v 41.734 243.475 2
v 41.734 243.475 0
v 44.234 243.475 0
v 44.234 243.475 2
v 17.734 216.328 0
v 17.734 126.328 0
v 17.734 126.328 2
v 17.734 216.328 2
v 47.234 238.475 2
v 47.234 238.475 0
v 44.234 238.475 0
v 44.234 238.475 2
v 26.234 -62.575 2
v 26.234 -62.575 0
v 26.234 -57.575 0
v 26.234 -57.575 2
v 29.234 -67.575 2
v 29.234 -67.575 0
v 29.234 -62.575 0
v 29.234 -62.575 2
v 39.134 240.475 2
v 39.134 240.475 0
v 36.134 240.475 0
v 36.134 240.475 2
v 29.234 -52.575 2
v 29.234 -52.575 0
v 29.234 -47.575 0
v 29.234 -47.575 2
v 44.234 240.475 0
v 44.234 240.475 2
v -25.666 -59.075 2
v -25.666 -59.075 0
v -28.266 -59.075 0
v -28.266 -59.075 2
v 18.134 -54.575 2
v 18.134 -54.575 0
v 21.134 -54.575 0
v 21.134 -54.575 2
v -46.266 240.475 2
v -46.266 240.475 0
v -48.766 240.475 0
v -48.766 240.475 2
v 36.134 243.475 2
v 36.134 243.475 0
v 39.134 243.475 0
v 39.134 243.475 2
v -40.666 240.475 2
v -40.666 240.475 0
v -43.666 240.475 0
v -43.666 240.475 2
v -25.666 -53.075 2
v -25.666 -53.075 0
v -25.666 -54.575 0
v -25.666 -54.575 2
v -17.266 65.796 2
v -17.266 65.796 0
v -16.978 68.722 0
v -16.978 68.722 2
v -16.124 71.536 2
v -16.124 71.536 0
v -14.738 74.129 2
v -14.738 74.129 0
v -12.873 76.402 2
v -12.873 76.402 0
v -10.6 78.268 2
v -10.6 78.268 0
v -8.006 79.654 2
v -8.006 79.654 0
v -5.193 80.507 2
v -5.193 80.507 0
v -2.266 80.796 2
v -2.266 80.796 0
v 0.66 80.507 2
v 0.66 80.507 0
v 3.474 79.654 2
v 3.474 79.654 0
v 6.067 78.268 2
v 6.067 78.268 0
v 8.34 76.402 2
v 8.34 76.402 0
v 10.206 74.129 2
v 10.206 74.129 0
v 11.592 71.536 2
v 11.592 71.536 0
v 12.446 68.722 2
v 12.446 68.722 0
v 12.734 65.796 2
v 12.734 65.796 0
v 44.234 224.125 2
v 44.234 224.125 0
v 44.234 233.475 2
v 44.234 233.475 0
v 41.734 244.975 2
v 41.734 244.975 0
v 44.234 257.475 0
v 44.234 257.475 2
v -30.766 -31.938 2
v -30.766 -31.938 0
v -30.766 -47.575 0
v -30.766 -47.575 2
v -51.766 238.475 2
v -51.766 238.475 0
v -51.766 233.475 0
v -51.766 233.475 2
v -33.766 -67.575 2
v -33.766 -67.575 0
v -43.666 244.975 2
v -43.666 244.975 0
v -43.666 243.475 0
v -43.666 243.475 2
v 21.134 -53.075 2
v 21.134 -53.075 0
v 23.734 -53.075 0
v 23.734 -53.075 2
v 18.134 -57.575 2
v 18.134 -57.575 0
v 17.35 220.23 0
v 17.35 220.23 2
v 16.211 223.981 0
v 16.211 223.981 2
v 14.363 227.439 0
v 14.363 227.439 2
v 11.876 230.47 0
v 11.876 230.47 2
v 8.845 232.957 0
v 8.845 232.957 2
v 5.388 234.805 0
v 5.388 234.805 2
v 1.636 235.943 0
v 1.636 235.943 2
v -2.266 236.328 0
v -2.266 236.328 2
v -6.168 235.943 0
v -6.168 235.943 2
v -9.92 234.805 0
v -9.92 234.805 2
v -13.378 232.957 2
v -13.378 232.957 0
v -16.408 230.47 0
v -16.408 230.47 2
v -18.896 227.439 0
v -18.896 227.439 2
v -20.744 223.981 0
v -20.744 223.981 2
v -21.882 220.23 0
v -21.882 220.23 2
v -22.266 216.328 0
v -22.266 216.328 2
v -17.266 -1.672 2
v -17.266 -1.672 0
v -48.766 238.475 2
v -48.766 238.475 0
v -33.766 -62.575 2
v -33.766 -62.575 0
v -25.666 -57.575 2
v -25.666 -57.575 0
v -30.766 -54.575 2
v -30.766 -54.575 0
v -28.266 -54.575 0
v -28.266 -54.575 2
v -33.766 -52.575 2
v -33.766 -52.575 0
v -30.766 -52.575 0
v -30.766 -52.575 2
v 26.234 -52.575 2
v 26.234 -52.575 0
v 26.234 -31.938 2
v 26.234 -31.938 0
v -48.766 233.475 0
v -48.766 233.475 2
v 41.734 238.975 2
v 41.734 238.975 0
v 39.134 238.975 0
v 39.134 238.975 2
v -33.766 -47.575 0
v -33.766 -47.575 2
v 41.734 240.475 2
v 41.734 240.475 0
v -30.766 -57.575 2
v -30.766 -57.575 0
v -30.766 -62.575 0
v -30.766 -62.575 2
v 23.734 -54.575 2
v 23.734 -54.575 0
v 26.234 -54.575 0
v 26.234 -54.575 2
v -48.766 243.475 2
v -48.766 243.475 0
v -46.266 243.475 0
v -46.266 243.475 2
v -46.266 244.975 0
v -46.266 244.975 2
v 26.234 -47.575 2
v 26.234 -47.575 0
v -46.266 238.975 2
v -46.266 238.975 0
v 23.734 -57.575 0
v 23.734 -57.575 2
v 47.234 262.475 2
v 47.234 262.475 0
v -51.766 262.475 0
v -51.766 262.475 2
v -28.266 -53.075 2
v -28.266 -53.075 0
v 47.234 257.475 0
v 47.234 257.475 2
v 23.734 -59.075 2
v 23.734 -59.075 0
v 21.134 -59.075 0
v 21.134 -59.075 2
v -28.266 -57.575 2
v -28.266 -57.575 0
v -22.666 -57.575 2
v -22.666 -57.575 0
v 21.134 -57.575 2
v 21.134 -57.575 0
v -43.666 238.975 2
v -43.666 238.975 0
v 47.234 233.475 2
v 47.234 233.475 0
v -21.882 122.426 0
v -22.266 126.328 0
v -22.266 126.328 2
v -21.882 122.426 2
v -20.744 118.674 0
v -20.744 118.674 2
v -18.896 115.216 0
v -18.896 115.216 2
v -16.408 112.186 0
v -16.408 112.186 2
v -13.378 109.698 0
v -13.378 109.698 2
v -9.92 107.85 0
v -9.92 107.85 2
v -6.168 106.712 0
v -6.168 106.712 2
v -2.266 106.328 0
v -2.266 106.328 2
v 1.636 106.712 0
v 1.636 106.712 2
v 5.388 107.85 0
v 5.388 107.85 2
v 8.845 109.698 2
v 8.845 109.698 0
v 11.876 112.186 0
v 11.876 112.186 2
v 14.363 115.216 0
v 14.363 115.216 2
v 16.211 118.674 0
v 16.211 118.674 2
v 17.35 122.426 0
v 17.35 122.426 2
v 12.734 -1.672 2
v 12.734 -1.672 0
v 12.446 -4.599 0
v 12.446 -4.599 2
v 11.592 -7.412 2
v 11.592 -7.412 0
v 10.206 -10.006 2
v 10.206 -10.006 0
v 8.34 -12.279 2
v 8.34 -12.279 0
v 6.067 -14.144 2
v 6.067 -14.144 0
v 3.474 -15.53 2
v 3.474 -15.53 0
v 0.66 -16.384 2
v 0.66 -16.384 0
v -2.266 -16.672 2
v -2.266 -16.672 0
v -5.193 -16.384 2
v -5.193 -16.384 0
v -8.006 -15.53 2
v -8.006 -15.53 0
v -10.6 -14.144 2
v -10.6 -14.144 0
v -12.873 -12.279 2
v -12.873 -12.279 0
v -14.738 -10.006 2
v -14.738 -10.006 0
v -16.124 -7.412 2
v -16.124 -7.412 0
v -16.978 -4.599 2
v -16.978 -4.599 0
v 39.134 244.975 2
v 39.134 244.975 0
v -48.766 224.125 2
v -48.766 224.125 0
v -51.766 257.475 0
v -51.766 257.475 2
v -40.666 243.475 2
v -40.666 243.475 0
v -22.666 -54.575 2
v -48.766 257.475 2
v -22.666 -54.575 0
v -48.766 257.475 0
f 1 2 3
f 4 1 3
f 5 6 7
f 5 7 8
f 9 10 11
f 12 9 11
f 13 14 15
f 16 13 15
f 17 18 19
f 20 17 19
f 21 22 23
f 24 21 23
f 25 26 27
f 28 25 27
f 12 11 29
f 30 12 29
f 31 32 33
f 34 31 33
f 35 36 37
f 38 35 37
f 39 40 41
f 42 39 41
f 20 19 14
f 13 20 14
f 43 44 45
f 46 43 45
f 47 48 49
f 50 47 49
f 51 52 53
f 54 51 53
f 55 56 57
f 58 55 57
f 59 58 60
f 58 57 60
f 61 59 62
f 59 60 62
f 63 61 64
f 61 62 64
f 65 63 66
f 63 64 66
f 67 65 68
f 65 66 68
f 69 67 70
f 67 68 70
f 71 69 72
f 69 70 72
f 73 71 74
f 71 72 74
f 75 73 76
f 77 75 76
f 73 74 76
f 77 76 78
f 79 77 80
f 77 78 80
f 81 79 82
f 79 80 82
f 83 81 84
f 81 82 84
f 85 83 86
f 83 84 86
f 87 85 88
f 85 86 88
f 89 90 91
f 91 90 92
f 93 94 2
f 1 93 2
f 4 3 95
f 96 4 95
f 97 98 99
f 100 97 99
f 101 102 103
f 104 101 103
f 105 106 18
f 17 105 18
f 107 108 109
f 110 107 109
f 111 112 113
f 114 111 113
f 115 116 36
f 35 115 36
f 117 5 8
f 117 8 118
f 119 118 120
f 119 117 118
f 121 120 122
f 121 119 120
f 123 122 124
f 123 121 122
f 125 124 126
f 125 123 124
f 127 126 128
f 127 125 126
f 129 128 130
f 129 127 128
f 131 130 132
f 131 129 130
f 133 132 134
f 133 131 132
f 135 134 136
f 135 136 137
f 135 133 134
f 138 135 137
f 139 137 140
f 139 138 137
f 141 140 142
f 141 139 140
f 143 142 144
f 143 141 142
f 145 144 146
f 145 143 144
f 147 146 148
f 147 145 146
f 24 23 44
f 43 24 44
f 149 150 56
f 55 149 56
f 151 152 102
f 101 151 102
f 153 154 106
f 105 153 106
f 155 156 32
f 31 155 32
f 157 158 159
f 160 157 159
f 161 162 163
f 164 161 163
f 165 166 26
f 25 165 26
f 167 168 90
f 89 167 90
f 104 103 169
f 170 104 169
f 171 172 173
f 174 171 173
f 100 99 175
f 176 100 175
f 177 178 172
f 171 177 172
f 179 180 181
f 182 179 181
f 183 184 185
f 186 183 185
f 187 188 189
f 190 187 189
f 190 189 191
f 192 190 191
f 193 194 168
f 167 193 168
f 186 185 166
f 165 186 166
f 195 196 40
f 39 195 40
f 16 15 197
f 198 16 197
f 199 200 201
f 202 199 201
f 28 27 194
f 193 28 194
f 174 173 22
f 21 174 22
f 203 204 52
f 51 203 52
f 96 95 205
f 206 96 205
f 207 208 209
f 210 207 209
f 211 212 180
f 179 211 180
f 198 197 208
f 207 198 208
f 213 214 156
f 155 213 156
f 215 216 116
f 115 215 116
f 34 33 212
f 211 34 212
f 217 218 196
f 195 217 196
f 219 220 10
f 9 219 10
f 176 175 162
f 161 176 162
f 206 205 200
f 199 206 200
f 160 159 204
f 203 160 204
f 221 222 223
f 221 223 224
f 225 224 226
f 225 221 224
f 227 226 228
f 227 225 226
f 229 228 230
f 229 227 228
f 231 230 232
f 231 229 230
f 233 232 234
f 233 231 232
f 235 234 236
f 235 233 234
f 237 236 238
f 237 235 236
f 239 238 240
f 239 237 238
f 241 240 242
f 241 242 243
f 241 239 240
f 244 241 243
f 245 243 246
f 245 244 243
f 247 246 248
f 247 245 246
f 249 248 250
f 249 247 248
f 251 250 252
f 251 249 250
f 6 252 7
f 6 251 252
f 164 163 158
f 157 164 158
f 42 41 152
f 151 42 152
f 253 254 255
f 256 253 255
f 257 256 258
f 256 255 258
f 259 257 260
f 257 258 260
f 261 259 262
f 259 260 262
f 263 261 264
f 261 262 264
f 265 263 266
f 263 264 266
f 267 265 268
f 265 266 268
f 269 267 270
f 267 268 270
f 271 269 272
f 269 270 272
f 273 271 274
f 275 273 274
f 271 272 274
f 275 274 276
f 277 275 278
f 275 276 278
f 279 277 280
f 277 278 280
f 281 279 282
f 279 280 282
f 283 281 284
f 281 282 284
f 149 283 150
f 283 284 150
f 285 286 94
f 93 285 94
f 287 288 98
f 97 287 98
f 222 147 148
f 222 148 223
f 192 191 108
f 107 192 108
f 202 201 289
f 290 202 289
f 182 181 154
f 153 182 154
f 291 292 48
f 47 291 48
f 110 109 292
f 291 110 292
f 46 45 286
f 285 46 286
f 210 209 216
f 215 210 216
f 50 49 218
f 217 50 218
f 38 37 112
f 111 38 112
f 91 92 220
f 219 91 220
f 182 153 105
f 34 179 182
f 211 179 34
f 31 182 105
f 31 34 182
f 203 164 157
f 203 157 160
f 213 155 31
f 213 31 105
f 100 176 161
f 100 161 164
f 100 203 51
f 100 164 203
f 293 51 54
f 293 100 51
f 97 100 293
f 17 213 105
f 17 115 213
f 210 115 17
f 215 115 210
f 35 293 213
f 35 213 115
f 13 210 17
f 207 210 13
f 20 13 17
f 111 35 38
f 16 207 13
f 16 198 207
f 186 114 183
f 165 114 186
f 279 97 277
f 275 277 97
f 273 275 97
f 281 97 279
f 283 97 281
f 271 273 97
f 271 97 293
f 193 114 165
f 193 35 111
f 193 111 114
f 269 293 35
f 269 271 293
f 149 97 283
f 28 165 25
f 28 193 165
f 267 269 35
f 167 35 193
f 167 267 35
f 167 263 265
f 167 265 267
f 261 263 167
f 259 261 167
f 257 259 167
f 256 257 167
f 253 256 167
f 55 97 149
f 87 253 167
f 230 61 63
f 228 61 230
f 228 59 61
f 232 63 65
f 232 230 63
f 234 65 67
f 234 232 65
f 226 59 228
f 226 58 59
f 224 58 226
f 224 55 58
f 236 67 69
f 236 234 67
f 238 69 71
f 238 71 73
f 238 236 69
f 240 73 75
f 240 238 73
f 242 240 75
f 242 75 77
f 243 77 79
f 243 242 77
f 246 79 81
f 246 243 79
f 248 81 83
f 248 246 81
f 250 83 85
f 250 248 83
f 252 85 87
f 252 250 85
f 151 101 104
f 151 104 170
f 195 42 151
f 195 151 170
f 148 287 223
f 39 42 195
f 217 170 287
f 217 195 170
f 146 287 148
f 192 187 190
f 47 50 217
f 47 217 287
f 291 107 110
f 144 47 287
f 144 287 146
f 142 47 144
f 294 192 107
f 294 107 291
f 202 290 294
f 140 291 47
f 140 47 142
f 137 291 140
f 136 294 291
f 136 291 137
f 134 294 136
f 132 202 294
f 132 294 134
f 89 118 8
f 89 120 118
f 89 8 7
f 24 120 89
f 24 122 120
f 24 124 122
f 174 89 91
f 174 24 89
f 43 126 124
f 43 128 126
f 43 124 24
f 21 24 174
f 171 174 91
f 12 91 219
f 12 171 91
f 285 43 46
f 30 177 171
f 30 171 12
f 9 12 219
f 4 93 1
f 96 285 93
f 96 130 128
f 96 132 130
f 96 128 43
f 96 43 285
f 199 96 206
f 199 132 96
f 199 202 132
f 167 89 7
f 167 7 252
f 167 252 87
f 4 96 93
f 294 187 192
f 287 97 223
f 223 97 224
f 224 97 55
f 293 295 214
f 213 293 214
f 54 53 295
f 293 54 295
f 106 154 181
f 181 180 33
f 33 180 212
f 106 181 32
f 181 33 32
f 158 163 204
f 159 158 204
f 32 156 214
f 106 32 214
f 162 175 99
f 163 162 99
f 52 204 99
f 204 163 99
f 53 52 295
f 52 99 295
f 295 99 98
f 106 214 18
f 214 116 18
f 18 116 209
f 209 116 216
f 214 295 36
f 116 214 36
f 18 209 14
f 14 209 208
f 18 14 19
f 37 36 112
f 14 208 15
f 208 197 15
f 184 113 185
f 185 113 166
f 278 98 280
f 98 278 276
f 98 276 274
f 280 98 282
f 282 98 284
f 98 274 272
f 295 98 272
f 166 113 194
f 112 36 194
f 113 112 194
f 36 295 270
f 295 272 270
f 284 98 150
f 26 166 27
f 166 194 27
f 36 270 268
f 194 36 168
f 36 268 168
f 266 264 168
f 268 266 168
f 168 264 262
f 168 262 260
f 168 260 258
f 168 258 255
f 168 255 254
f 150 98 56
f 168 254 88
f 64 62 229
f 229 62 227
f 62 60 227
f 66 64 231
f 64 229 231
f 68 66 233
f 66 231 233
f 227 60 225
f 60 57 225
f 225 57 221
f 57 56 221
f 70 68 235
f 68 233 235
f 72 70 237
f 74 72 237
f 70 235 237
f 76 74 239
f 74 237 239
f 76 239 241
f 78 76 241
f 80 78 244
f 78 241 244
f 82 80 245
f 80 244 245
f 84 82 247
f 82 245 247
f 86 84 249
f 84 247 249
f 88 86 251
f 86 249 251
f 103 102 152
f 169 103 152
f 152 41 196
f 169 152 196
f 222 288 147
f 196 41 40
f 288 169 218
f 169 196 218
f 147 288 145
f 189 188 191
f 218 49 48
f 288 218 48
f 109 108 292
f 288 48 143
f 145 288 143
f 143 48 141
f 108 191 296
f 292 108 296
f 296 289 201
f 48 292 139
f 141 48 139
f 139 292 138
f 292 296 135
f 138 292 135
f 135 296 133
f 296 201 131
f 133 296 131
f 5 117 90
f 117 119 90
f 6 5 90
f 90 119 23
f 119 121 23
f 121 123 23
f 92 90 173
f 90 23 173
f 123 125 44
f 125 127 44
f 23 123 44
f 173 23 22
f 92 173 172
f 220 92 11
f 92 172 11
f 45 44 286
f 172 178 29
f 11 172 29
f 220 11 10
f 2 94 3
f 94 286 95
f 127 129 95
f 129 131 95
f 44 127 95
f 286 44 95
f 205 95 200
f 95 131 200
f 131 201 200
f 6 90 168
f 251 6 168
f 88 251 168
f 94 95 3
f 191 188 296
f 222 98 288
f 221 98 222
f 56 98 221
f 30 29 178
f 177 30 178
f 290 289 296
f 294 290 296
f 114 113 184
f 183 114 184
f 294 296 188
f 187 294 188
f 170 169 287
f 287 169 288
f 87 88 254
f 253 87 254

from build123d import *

# Parameters (mm, degrees)
EXTRUDE_1_DEPTH = 2


with BuildPart() as part:
    # 草图1 → 凸台-拉伸1 (new body)
    with BuildSketch(Plane.XY):
        Polygon((26.233844386, -52.574512395), (29.233844386, -52.574512395), (29.233844386, -47.574512395), (26.233844386, -47.574512395), (26.233844386, -31.938300989), (44.233844386, 224.125487605), (44.233844386, 233.475487605), (47.233844386, 233.475487605), (47.233844386, 238.475487605), (44.233844386, 238.475487605), (44.233844386, 240.475487605), (41.733844386, 240.475487605), (41.733844386, 238.975487605), (39.133844386, 238.975487605), (39.133844386, 240.475487605), (36.133844386, 240.475487605), (36.133844386, 243.475487605), (39.133844386, 243.475487605), (39.133844386, 244.975487605), (41.733844386, 244.975487605), (41.733844386, 243.475487605), (44.233844386, 243.475487605), (44.233844386, 248.475487605), (44.233844386, 257.475487605), (47.233844386, 257.475487605), (47.233844386, 262.475487605), (44.233844386, 262.475487605), (-48.766155614, 262.475487605), (-51.766155614, 262.475487605), (-51.766155614, 257.475487605), (-48.766155614, 257.475487605), (-48.766155614, 248.475487605), (-48.766155614, 243.475487605), (-46.266155614, 243.475487605), (-46.266155614, 244.975487605), (-43.666155614, 244.975487605), (-43.666155614, 243.475487605), (-40.666155614, 243.475487605), (-40.666155614, 240.475487605), (-43.666155614, 240.475487605), (-43.666155614, 238.975487605), (-46.266155614, 238.975487605), (-46.266155614, 240.475487605), (-48.766155614, 240.475487605), (-48.766155614, 238.475487605), (-51.766155614, 238.475487605), (-51.766155614, 233.475487605), (-48.766155614, 233.475487605), (-48.766155614, 224.125487605), (-30.766155614, -31.938300989), (-30.766155614, -47.574512395), (-33.766155614, -47.574512395), (-33.766155614, -52.574512395), (-30.766155614, -52.574512395), (-30.766155614, -54.574512395), (-28.266155614, -54.574512395), (-28.266155614, -53.074512395), (-25.666155614, -53.074512395), (-25.666155614, -54.574512395), (-22.666155614, -54.574512395), (-22.666155614, -57.574512395), (-25.666155614, -57.574512395), (-25.666155614, -59.074512395), (-28.266155614, -59.074512395), (-28.266155614, -57.574512395), (-30.766155614, -57.574512395), (-30.766155614, -62.574512395), (-33.766155614, -62.574512395), (-33.766155614, -67.574512395), (-30.766155614, -67.574512395), (26.233844386, -67.574512395), (29.233844386, -67.574512395), (29.233844386, -62.574512395), (26.233844386, -62.574512395), (26.233844386, -57.574512395), (23.733844386, -57.574512395), (23.733844386, -59.074512395), (21.133844386, -59.074512395), (21.133844386, -57.574512395), (18.133844386, -57.574512395), (18.133844386, -54.574512395), (21.133844386, -54.574512395), (21.133844386, -53.074512395), (23.733844386, -53.074512395), (23.733844386, -54.574512395), (26.233844386, -54.574512395), align=None)
        with BuildLine():
            Line((-17.266155614, -1.672218314), (-17.266155614, 65.795616335))
            ThreePointArc((-17.266155614, 65.795616335), (-2.266155614, 80.795616335), (12.733844386, 65.795616335))
            Line((12.733844386, 65.795616335), (12.733844386, -1.672218314))
            ThreePointArc((12.733844386, -1.672218314), (-2.266155614, -16.672218314), (-17.266155614, -1.672218314))
        make_face(mode=Mode.SUBTRACT)
        with BuildLine():
            Line((-22.266155614, 216.327781686), (-22.266155614, 126.327781686))
            ThreePointArc((-22.266155614, 126.327781686), (-2.266155614, 106.327781686), (17.733844386, 126.327781686))
            Line((17.733844386, 126.327781686), (17.733844386, 216.327781686))
            ThreePointArc((17.733844386, 216.327781686), (-2.266155614, 236.327781686), (-22.266155614, 216.327781686))
        make_face(mode=Mode.SUBTRACT)
    extrude(amount=EXTRUDE_1_DEPTH)


solid = part.part
